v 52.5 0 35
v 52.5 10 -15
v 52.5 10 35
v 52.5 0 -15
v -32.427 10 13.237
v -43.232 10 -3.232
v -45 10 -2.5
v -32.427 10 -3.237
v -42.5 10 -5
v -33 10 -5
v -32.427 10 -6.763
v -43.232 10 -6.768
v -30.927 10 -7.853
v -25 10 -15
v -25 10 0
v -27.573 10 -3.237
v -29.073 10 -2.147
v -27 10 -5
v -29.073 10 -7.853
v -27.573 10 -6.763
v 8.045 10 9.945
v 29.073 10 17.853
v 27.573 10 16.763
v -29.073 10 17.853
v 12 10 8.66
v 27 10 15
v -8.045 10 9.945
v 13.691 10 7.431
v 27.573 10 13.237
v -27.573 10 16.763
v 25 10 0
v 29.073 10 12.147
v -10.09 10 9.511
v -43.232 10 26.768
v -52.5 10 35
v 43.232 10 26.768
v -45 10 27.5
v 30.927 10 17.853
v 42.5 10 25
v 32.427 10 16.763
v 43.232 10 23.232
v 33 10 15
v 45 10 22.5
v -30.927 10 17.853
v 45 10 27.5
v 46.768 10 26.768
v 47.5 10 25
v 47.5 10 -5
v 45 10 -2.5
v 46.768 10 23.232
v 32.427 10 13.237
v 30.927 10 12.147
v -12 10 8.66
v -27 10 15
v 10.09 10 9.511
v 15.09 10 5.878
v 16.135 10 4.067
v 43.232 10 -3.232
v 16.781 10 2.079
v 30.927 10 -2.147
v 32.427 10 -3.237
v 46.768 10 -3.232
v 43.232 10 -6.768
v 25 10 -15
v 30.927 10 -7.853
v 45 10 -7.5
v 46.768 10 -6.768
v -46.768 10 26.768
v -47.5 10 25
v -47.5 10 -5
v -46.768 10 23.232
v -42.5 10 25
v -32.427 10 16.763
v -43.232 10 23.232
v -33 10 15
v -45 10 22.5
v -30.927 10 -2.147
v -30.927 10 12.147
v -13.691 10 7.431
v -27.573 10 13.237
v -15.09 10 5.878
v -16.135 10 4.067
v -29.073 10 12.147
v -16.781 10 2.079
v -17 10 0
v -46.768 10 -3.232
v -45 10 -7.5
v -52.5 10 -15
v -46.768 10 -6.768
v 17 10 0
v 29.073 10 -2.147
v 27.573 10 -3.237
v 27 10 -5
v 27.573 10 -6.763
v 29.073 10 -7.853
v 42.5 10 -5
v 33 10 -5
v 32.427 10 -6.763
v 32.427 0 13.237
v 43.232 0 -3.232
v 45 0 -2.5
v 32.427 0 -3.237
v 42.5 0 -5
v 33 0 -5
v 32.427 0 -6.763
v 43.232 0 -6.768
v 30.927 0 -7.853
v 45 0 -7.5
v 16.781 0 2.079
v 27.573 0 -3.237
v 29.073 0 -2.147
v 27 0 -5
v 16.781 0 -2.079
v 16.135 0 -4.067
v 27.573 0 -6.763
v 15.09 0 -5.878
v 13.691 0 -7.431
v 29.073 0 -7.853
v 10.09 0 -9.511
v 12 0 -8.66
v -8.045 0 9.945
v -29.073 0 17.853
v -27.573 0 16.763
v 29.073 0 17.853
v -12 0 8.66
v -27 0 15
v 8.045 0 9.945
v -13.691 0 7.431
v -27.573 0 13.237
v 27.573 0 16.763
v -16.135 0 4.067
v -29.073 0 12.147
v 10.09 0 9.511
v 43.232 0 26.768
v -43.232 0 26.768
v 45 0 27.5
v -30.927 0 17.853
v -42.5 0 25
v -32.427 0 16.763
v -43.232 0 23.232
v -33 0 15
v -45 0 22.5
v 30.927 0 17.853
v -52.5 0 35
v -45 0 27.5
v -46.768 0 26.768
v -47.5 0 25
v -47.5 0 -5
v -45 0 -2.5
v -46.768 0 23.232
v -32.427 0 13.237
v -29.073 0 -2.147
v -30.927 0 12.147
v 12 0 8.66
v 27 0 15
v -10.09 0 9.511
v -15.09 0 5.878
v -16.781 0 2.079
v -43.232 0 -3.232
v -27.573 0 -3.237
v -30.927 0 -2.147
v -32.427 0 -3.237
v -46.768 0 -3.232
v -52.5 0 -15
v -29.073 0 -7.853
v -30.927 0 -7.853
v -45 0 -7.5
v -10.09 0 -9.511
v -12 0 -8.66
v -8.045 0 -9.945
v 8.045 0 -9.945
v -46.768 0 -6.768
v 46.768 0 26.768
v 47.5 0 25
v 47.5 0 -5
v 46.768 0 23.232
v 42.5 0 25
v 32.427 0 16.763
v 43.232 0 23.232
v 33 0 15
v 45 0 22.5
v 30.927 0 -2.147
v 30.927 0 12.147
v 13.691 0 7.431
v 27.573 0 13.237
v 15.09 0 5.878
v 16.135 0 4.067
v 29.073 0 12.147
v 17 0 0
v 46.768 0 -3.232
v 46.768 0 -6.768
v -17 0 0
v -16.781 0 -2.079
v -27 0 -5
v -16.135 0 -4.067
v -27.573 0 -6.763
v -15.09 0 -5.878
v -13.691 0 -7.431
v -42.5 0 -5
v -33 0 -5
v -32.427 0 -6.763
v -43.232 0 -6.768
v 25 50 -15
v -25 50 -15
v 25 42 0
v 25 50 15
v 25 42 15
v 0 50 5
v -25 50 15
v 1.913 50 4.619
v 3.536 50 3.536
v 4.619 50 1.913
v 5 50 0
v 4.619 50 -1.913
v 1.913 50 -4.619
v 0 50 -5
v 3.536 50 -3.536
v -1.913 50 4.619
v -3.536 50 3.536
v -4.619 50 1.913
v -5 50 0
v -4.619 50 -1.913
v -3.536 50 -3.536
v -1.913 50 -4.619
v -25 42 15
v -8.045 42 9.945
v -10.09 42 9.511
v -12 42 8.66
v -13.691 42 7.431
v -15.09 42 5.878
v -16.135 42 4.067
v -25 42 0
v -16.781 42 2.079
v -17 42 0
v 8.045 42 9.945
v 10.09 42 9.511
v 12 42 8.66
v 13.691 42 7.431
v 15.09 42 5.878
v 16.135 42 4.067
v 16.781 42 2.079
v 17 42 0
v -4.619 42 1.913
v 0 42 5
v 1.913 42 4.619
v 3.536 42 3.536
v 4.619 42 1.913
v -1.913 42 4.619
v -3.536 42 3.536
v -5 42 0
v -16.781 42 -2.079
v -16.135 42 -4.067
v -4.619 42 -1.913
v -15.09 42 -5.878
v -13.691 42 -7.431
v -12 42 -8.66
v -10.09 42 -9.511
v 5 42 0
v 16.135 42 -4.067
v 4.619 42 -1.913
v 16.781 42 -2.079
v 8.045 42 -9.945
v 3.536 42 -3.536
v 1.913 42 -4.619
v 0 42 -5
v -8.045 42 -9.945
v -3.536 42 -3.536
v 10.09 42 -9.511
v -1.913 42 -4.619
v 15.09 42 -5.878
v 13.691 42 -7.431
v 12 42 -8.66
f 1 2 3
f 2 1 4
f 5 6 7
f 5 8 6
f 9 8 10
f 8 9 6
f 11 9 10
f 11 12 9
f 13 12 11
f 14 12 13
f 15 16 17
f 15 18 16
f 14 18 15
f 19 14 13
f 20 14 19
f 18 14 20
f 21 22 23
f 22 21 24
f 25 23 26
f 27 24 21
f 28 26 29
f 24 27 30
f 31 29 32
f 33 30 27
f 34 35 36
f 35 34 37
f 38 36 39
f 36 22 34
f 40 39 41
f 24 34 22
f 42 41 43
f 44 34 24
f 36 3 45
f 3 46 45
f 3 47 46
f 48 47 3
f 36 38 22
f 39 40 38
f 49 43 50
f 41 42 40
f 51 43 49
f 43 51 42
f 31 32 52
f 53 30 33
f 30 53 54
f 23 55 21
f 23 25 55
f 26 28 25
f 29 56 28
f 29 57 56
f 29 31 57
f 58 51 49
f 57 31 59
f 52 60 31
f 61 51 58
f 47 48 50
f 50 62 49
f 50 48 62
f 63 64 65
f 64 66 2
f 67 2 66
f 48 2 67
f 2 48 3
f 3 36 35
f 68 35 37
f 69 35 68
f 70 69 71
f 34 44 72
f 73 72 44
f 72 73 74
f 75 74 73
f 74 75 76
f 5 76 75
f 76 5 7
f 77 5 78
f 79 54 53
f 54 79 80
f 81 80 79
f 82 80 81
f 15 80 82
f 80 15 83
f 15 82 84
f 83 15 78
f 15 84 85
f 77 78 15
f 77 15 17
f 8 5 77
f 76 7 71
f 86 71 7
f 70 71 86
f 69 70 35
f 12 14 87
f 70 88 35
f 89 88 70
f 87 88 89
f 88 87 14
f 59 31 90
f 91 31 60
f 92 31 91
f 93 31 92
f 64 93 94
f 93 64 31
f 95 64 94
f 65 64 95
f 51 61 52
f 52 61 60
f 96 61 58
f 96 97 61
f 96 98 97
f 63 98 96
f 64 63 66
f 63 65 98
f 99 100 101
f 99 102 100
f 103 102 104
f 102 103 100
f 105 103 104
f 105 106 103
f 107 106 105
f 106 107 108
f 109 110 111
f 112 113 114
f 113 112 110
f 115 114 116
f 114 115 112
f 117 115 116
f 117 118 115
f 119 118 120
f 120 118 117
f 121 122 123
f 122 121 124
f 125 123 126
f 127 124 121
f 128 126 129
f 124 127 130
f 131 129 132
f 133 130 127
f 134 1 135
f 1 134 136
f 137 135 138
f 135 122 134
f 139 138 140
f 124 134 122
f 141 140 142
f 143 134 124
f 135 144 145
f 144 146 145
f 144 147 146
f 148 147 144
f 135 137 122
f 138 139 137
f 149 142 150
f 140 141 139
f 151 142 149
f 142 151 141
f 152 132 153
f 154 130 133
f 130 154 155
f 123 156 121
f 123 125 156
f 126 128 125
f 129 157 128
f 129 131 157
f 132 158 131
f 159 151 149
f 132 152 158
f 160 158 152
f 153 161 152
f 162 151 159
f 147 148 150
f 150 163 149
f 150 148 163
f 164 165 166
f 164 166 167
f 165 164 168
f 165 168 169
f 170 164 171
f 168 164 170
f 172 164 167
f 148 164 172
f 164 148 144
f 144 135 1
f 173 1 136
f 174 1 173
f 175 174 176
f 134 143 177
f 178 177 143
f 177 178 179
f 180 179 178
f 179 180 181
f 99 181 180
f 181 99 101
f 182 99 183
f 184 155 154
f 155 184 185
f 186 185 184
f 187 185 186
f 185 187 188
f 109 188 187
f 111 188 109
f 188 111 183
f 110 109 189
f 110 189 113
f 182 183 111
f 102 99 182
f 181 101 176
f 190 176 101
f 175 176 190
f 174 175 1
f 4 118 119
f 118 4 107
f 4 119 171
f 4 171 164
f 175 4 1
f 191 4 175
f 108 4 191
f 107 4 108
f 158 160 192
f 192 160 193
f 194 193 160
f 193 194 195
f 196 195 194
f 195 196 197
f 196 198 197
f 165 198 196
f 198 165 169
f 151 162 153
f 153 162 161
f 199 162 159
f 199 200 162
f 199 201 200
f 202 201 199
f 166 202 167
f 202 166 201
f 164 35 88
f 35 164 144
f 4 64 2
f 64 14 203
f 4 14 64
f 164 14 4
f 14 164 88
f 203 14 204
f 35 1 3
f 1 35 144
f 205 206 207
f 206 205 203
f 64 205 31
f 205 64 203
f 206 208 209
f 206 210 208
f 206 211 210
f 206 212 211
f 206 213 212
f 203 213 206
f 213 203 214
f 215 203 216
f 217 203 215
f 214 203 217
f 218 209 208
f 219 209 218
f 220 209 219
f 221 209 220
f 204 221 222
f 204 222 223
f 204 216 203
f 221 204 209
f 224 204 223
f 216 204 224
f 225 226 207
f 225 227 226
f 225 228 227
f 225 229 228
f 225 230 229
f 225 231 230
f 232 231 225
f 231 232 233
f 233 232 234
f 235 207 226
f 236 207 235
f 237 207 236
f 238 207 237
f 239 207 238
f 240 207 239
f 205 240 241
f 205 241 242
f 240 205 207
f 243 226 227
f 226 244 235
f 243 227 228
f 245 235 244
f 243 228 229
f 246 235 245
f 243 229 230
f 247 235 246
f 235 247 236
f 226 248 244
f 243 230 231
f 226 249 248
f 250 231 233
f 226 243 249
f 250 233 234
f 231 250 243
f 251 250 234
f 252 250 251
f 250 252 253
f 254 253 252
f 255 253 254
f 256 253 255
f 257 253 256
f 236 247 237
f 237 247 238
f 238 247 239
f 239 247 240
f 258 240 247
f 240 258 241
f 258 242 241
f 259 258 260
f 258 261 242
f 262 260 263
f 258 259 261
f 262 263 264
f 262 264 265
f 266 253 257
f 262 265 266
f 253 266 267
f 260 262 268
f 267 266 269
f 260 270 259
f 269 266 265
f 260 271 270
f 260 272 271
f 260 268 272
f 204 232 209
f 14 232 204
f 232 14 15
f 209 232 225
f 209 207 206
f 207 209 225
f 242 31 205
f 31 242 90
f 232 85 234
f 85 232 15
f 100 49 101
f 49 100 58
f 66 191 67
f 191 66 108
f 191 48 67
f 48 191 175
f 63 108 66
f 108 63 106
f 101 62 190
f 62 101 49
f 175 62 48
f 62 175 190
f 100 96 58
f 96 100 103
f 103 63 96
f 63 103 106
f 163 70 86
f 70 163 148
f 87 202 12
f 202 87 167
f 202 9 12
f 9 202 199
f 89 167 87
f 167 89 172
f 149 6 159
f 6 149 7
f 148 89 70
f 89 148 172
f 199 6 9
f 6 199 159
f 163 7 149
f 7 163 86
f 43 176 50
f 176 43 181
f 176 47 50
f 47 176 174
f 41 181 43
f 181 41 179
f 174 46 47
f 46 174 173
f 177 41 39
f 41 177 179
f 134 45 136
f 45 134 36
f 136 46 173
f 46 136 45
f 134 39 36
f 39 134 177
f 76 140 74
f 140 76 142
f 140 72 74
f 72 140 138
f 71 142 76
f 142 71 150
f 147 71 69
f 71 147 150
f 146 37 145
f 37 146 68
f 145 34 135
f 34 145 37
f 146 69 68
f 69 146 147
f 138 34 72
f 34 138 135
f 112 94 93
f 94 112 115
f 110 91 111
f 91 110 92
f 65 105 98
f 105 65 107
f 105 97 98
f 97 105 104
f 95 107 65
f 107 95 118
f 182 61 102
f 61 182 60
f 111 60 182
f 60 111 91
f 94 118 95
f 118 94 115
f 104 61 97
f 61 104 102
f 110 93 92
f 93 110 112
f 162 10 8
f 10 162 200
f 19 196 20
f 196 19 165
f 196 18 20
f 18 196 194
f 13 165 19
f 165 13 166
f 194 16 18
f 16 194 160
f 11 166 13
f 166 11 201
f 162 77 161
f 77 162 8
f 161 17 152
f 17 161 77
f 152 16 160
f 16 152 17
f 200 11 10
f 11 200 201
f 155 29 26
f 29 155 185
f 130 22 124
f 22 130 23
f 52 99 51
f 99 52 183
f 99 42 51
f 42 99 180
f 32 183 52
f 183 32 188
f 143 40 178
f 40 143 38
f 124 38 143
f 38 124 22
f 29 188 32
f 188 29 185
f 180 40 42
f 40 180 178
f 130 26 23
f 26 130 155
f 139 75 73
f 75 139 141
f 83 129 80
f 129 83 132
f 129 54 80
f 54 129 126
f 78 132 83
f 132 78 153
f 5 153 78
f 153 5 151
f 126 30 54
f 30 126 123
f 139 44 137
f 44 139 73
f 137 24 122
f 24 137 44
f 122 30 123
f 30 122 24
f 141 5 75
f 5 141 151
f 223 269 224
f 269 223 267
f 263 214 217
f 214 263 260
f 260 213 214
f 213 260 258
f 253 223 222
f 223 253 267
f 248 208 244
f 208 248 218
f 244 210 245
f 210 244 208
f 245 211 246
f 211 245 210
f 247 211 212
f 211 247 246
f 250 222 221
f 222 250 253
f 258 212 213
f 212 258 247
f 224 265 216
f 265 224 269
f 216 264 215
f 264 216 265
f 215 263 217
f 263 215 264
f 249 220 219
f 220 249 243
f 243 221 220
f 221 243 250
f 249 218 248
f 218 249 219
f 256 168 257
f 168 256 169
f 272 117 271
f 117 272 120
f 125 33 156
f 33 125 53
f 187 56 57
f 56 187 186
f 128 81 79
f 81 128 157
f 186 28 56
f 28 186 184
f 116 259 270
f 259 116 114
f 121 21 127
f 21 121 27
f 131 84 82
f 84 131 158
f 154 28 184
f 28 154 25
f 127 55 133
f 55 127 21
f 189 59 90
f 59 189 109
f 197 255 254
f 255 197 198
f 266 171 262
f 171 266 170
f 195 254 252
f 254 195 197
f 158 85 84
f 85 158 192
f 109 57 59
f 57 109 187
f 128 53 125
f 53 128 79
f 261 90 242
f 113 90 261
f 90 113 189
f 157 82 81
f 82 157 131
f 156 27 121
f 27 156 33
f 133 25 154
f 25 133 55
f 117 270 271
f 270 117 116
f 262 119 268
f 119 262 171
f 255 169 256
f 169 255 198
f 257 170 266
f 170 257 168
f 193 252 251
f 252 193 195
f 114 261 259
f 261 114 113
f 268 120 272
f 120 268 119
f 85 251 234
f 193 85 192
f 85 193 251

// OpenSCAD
// SPDX-License-Identifier: CC-BY-SA-4.0
//
//Mounting bracket for the motor
//
//Copyright (C) 2018 Peter Bennett <thelargeostrich@gmail.com>
//
//This design is licensed under a Creative Commons Attribution-ShareAlike
//4.0 International license.
//
//You are free to:
//  Share — copy and redistribute the material in any medium or format
//  Adapt — remix, transform, and build upon the material
//          for any purpose, even commercially.
//
//Under the following terms:
//
//  Attribution — You must give appropriate credit, provide a link to
//                the license, and indicate if changes were made. You
//                may do so in any reasonable manner, but not in any
//                way that suggests the licensor endorses you or your use.
//  ShareAlike  — If you remix, transform, or build upon the material,
//                you must distribute your contributions under the same
//                license as the original.
//  No additional restrictions — You may not apply legal terms or
//                technological measures that legally restrict others
//                from doing anything the license permits.

//this piece is the highest stressed piece of all: use appropriate print settings to reflect this

rotate([270,0,0])
    difference(){
        union(){
            translate([0,-10,5])
                cube([105,50,10], center=true);
            translate([0,0,46])
                cube([50,30,8], center=true);
            translate([0,7.5,30])
                cube([50,15,40], center=true);
        }
        //bolt holes
        //to intake
        translate([45,5,0])
            cylinder(r=2.5,h=200, center=true);
        translate([-45,5,0])
            cylinder(r=2.5,h=200, center=true);
        translate([45,-25,0])
            cylinder(r=2.5,h=200, center=true);
        translate([-45,-25,0])
            cylinder(r=2.5,h=200, center=true);
        //tube holes
        translate([30,5,0])
            cylinder(r=3,h=200, center=true);
        translate([-30,5,0])
            cylinder(r=3,h=200, center=true);
        translate([30,-15,0])
            cylinder(r=3,h=200, center=true);
        translate([-30,-15,0])
            cylinder(r=3,h=200, center=true);
        //shaft holes
        cylinder(r=5,h=200, center=true);
        hull(){
            translate([7,0,0])
                cylinder(r=10,h=84, center=true);
            translate([-7,0,0])
                cylinder(r=10,h=84, center=true);
        };
    };
